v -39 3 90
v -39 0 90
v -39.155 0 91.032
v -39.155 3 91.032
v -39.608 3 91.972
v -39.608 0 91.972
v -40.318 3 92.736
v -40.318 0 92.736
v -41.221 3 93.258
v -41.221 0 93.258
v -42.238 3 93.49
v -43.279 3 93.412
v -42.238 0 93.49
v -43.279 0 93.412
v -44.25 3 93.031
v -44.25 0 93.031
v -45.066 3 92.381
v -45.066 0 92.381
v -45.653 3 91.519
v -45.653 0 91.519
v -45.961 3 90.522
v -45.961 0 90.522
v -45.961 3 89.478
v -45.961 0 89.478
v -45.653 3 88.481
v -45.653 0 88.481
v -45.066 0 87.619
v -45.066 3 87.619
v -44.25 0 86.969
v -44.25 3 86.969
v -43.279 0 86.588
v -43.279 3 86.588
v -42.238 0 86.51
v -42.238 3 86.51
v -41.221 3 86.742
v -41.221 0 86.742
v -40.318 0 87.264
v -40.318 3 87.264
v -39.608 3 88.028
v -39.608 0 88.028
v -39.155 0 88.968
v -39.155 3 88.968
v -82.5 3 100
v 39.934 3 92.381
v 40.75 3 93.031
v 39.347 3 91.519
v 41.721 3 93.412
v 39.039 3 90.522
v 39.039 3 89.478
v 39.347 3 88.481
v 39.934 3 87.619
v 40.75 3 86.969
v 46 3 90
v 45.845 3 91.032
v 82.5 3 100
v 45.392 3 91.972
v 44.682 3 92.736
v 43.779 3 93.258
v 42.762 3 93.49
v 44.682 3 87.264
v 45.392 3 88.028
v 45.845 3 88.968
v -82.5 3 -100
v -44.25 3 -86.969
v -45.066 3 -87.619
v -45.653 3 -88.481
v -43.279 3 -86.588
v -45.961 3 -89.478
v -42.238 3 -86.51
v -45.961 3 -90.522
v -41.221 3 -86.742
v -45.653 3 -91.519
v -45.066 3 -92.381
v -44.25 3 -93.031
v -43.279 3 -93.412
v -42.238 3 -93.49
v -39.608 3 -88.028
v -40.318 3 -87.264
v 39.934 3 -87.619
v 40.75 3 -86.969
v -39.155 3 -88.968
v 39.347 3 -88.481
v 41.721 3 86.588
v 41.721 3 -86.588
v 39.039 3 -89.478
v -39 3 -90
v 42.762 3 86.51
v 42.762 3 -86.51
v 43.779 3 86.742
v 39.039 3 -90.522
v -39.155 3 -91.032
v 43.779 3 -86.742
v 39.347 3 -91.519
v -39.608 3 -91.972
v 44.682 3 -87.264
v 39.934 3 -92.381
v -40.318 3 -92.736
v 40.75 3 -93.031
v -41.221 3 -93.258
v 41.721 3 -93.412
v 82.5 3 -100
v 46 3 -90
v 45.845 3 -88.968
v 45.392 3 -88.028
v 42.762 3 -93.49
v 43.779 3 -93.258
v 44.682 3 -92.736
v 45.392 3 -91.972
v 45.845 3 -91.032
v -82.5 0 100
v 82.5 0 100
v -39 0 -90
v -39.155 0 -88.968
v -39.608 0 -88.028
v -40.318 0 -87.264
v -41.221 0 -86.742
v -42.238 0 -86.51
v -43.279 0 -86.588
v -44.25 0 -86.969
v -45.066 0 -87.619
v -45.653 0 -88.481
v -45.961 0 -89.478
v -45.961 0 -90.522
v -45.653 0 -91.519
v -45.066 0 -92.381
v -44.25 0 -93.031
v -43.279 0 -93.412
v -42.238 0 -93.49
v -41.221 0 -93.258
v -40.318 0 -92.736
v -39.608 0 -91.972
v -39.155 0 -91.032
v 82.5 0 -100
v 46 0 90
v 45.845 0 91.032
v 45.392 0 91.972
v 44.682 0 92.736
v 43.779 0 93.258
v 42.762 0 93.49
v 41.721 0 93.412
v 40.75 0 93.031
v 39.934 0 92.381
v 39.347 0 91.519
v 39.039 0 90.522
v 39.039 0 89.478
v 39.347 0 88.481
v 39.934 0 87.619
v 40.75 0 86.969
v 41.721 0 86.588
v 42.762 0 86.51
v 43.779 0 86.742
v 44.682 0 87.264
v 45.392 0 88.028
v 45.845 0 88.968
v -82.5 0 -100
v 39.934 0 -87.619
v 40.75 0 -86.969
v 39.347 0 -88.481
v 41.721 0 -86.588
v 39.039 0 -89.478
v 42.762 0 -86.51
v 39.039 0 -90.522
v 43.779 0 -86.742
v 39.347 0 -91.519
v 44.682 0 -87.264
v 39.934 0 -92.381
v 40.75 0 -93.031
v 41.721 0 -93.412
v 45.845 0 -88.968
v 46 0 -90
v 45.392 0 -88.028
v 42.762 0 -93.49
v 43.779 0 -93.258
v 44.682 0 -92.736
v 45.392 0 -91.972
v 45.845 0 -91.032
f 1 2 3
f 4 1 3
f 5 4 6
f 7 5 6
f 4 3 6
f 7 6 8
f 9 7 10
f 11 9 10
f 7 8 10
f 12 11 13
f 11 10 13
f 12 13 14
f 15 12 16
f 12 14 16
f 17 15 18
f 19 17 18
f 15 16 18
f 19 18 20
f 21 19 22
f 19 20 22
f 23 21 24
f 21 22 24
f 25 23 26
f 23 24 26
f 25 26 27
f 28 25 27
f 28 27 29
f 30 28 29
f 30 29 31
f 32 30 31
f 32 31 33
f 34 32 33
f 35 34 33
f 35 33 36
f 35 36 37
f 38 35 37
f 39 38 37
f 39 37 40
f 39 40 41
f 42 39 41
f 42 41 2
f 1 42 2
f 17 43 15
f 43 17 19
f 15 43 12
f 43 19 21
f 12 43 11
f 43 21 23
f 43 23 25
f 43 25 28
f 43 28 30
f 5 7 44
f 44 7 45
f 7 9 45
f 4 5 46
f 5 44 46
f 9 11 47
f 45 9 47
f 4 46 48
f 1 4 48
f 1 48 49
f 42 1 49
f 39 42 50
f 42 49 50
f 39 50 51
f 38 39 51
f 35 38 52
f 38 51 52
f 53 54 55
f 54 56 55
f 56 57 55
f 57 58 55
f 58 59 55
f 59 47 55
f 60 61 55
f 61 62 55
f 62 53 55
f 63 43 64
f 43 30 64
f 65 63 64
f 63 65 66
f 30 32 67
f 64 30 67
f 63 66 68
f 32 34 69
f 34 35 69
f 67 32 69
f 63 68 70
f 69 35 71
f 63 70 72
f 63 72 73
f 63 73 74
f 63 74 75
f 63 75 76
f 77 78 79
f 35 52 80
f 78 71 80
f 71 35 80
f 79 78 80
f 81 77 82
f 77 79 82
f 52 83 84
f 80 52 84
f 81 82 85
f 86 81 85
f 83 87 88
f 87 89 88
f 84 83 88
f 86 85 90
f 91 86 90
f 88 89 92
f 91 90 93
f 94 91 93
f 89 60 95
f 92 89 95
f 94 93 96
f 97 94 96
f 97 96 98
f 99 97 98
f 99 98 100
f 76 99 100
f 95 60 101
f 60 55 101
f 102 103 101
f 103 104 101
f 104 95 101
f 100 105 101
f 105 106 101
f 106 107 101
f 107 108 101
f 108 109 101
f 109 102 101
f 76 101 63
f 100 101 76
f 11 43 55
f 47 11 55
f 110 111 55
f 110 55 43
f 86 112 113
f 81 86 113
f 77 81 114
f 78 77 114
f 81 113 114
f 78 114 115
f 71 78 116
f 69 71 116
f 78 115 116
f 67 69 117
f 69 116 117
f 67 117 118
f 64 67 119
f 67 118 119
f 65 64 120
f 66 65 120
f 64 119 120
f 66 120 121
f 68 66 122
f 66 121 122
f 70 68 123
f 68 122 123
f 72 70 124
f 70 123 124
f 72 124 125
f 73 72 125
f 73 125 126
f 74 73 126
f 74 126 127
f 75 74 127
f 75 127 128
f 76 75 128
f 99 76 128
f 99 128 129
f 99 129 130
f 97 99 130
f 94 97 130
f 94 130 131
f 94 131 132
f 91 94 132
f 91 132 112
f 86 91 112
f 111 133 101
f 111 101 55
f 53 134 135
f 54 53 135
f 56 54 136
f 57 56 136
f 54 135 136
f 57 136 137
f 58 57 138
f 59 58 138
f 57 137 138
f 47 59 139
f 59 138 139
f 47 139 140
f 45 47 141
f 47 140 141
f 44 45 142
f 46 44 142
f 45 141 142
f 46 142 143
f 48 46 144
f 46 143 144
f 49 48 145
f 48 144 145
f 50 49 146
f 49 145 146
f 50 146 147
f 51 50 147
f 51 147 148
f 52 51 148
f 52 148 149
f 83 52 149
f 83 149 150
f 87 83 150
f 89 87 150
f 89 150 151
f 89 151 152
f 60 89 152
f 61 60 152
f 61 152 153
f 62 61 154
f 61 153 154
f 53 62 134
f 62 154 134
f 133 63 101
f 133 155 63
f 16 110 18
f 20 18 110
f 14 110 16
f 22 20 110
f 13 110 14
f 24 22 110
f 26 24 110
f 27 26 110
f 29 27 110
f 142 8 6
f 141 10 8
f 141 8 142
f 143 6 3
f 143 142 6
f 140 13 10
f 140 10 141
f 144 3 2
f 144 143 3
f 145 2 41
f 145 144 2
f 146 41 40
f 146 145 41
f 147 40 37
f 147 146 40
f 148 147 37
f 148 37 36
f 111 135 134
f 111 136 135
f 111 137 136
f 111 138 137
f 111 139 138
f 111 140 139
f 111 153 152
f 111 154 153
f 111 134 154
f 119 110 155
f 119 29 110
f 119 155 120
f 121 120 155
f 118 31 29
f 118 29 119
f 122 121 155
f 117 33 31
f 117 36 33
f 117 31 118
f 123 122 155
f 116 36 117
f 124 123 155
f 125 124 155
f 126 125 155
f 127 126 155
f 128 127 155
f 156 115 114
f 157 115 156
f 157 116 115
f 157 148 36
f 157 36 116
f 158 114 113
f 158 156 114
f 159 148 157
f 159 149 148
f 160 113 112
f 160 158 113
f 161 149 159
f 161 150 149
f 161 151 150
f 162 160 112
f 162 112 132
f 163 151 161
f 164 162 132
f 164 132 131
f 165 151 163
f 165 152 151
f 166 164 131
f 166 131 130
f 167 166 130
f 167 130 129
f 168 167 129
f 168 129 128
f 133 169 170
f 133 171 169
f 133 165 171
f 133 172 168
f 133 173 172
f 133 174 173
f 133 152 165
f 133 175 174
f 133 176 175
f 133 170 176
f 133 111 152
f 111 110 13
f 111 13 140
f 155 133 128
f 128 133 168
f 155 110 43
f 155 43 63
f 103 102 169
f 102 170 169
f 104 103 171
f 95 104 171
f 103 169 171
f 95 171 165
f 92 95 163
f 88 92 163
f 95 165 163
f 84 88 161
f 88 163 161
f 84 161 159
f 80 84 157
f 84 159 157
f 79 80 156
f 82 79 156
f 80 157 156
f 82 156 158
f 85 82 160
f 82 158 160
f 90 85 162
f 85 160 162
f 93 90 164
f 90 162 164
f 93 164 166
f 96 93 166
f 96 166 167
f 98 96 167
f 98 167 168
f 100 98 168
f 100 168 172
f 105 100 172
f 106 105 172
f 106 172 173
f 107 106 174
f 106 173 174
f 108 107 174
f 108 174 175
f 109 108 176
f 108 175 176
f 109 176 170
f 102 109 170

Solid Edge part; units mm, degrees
sketch "Sketch1" plane through (0, 0, 0) normal (0, -1, 0) x (1, 0, 0)
  line L0 (-82.5, -100) -> (82.5, -100)
  line L1 (82.5, -100) -> (82.5, 100)
  line L2 (82.5, 100) -> (-82.5, 100)
  line L3 (-82.5, 100) -> (-82.5, -100)
  dimension "D1" = 200
  dimension "D2" = 165
extrude "Protrusion1" add sketch "Sketch1" against normal blind 3
sketch "Sketch2" plane through (0, 0, 0) normal (0, -1, 0) x (1, 0, 0)
  circle A0 centre (-42.5, 90) radius 3.5
  circle A1 centre (42.5, 90) radius 3.5
  dimension "D1" = 85
  dimension "D2" = 10
  dimension "D3" = 7
extrude "Cutout1" cut sketch "Sketch2" against normal through all
sketch "Sketch3" plane through (0, 0, 0) normal (0, -1, 0) x (1, 0, 0)
  circle A0 centre (-42.5, -90) radius 3.5
  circle A1 centre (42.5, -90) radius 3.5
extrude "Cutout2" cut sketch "Sketch3" against normal through all
properties material "Nylon, allgemein"
